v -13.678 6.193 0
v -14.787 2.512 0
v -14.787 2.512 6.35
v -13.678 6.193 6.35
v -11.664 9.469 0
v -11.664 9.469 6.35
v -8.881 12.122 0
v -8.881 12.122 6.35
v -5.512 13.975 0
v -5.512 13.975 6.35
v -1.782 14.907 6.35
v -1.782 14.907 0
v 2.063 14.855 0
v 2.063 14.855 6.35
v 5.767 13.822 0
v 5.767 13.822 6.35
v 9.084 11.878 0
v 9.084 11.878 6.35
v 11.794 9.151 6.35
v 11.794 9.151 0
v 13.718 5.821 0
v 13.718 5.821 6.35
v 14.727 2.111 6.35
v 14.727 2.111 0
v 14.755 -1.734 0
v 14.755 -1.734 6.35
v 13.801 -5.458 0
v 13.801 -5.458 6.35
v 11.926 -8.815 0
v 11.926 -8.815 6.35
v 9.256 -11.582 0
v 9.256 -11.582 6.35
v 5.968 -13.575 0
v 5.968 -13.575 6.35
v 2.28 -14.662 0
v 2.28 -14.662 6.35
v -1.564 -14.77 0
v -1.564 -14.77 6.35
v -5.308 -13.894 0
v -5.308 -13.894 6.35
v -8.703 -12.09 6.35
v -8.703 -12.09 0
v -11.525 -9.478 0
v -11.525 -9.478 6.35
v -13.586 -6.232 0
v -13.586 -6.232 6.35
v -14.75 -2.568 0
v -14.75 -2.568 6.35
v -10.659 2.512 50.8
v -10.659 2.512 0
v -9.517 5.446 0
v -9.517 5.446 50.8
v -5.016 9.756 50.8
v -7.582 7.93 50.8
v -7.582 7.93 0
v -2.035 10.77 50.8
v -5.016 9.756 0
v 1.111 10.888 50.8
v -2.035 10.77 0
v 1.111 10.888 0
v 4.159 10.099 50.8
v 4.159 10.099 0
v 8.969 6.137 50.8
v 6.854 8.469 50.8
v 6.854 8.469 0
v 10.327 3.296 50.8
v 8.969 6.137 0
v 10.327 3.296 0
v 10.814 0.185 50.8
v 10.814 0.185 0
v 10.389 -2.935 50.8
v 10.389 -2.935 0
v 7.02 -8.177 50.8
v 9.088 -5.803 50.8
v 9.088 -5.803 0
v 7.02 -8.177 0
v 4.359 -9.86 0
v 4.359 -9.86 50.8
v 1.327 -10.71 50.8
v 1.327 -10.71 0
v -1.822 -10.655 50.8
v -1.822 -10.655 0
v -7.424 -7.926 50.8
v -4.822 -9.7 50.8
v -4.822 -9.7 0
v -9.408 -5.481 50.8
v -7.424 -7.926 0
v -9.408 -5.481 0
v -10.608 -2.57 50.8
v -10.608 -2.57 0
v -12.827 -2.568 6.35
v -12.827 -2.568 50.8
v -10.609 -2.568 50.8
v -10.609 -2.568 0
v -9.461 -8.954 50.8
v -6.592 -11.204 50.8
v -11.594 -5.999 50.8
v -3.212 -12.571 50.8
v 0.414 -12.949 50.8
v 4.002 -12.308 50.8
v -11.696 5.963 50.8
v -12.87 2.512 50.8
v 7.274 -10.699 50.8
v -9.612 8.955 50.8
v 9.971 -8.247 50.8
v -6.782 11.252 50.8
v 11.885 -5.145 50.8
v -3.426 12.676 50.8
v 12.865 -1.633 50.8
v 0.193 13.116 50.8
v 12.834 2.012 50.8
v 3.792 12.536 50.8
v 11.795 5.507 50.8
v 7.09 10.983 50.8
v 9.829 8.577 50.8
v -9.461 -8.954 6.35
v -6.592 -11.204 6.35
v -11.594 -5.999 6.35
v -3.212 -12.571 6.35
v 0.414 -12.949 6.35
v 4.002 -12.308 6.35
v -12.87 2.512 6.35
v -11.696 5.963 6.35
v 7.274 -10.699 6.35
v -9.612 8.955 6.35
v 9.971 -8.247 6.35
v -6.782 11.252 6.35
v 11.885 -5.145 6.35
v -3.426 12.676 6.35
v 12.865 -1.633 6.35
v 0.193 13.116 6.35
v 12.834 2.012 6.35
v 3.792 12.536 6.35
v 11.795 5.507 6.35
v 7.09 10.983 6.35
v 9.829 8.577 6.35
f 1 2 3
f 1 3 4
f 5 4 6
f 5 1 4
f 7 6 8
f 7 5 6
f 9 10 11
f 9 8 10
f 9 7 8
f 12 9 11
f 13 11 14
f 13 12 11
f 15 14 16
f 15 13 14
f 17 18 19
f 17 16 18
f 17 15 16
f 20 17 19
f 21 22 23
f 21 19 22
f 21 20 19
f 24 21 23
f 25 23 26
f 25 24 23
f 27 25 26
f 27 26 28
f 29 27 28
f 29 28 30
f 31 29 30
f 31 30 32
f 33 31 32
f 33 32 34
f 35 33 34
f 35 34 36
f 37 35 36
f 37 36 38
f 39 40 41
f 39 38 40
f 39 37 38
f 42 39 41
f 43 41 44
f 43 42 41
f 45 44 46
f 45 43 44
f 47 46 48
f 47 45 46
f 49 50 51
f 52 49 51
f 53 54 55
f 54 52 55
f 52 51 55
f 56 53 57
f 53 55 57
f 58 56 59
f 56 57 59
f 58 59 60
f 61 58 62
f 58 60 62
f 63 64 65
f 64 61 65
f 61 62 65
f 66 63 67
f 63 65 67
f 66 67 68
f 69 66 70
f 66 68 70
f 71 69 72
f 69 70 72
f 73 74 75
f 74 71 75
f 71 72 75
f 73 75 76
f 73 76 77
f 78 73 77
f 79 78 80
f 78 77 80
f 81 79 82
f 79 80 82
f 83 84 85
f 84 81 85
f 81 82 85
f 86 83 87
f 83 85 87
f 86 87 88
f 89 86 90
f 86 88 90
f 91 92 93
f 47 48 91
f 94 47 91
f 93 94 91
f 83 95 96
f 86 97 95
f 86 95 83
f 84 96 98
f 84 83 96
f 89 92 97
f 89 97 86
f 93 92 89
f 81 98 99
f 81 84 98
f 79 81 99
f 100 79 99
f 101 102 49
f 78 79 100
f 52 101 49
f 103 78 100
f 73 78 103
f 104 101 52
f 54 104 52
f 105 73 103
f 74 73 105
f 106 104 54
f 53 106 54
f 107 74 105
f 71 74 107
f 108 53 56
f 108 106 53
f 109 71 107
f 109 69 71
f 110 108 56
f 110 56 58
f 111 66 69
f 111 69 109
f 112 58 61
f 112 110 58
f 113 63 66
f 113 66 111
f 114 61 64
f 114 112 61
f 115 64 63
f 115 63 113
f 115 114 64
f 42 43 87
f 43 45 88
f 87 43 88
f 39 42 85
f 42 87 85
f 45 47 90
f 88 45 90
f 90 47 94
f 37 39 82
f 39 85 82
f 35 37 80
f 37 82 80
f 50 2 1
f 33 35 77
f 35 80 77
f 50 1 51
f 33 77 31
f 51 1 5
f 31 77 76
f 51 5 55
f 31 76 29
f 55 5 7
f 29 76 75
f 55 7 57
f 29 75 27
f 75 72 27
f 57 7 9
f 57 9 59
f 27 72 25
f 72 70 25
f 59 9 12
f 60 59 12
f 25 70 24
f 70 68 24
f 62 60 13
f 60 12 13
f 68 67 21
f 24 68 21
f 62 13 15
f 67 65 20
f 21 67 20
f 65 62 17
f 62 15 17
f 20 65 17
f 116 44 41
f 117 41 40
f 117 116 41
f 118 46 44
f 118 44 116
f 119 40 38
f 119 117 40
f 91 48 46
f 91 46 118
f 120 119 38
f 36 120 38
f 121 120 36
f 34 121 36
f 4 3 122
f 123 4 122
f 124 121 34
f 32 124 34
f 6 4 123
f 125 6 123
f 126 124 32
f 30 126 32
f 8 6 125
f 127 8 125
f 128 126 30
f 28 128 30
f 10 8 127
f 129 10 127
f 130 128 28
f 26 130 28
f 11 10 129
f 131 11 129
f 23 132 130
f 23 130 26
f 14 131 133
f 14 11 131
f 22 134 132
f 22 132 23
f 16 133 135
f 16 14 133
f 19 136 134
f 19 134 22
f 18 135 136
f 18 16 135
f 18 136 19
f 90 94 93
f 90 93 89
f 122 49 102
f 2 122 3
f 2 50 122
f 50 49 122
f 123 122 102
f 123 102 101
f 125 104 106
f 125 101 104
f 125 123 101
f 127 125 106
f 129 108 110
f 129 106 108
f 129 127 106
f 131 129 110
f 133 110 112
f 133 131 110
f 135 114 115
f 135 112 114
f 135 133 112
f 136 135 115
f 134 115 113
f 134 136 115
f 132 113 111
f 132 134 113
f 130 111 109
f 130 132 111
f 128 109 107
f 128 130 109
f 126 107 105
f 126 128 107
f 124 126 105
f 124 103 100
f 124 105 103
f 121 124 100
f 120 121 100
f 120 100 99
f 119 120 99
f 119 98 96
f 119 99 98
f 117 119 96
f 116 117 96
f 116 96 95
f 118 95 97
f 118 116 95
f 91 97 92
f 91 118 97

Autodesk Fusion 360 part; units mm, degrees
sketch "Sketch1" plane through (0, 0, 0) normal (0, 0, 1) x (1, 0, 0)
  line L0 (-14.75, -2.5675) -> (-10.6089, -2.5675)
  line L1 (-10.6089, -2.5675) -> (-10.6082, -2.5702)
  line L2 (-10.6404, 2.5117) -> (-14.7873, 2.5117)
  arc A0 (-14.75, -2.5675) -> (-14.7873, 2.5117) centre (-0.0603, 0.0802) ccw
  arc A1 (-12.8266, -2.5675) -> (-12.8696, 2.5117) centre (-0.0603, 0.0802) ccw
  arc A2 (-10.6082, -2.5702) -> (-10.6589, 2.5117) centre (-0.0605, 0.0763) ccw
sketch "Sketch3" plane through (0, 0, 0) normal (0, 0, 1) x (1, 0, 0)
extrude "Extrude1" add sketch "Sketch1" along normal blind 6.35
extrude "Extrude4" cut sketch "Sketch1" along normal blind 43.18 contours L0 L1 L2 A1 A2
extrude "Extrude5" add sketch "Sketch1" along normal blind 50.8 contours L0 L1 L2 A1 A2
extrude "Extrude3" [suppressed]
extrude "Extrude2" [suppressed]
